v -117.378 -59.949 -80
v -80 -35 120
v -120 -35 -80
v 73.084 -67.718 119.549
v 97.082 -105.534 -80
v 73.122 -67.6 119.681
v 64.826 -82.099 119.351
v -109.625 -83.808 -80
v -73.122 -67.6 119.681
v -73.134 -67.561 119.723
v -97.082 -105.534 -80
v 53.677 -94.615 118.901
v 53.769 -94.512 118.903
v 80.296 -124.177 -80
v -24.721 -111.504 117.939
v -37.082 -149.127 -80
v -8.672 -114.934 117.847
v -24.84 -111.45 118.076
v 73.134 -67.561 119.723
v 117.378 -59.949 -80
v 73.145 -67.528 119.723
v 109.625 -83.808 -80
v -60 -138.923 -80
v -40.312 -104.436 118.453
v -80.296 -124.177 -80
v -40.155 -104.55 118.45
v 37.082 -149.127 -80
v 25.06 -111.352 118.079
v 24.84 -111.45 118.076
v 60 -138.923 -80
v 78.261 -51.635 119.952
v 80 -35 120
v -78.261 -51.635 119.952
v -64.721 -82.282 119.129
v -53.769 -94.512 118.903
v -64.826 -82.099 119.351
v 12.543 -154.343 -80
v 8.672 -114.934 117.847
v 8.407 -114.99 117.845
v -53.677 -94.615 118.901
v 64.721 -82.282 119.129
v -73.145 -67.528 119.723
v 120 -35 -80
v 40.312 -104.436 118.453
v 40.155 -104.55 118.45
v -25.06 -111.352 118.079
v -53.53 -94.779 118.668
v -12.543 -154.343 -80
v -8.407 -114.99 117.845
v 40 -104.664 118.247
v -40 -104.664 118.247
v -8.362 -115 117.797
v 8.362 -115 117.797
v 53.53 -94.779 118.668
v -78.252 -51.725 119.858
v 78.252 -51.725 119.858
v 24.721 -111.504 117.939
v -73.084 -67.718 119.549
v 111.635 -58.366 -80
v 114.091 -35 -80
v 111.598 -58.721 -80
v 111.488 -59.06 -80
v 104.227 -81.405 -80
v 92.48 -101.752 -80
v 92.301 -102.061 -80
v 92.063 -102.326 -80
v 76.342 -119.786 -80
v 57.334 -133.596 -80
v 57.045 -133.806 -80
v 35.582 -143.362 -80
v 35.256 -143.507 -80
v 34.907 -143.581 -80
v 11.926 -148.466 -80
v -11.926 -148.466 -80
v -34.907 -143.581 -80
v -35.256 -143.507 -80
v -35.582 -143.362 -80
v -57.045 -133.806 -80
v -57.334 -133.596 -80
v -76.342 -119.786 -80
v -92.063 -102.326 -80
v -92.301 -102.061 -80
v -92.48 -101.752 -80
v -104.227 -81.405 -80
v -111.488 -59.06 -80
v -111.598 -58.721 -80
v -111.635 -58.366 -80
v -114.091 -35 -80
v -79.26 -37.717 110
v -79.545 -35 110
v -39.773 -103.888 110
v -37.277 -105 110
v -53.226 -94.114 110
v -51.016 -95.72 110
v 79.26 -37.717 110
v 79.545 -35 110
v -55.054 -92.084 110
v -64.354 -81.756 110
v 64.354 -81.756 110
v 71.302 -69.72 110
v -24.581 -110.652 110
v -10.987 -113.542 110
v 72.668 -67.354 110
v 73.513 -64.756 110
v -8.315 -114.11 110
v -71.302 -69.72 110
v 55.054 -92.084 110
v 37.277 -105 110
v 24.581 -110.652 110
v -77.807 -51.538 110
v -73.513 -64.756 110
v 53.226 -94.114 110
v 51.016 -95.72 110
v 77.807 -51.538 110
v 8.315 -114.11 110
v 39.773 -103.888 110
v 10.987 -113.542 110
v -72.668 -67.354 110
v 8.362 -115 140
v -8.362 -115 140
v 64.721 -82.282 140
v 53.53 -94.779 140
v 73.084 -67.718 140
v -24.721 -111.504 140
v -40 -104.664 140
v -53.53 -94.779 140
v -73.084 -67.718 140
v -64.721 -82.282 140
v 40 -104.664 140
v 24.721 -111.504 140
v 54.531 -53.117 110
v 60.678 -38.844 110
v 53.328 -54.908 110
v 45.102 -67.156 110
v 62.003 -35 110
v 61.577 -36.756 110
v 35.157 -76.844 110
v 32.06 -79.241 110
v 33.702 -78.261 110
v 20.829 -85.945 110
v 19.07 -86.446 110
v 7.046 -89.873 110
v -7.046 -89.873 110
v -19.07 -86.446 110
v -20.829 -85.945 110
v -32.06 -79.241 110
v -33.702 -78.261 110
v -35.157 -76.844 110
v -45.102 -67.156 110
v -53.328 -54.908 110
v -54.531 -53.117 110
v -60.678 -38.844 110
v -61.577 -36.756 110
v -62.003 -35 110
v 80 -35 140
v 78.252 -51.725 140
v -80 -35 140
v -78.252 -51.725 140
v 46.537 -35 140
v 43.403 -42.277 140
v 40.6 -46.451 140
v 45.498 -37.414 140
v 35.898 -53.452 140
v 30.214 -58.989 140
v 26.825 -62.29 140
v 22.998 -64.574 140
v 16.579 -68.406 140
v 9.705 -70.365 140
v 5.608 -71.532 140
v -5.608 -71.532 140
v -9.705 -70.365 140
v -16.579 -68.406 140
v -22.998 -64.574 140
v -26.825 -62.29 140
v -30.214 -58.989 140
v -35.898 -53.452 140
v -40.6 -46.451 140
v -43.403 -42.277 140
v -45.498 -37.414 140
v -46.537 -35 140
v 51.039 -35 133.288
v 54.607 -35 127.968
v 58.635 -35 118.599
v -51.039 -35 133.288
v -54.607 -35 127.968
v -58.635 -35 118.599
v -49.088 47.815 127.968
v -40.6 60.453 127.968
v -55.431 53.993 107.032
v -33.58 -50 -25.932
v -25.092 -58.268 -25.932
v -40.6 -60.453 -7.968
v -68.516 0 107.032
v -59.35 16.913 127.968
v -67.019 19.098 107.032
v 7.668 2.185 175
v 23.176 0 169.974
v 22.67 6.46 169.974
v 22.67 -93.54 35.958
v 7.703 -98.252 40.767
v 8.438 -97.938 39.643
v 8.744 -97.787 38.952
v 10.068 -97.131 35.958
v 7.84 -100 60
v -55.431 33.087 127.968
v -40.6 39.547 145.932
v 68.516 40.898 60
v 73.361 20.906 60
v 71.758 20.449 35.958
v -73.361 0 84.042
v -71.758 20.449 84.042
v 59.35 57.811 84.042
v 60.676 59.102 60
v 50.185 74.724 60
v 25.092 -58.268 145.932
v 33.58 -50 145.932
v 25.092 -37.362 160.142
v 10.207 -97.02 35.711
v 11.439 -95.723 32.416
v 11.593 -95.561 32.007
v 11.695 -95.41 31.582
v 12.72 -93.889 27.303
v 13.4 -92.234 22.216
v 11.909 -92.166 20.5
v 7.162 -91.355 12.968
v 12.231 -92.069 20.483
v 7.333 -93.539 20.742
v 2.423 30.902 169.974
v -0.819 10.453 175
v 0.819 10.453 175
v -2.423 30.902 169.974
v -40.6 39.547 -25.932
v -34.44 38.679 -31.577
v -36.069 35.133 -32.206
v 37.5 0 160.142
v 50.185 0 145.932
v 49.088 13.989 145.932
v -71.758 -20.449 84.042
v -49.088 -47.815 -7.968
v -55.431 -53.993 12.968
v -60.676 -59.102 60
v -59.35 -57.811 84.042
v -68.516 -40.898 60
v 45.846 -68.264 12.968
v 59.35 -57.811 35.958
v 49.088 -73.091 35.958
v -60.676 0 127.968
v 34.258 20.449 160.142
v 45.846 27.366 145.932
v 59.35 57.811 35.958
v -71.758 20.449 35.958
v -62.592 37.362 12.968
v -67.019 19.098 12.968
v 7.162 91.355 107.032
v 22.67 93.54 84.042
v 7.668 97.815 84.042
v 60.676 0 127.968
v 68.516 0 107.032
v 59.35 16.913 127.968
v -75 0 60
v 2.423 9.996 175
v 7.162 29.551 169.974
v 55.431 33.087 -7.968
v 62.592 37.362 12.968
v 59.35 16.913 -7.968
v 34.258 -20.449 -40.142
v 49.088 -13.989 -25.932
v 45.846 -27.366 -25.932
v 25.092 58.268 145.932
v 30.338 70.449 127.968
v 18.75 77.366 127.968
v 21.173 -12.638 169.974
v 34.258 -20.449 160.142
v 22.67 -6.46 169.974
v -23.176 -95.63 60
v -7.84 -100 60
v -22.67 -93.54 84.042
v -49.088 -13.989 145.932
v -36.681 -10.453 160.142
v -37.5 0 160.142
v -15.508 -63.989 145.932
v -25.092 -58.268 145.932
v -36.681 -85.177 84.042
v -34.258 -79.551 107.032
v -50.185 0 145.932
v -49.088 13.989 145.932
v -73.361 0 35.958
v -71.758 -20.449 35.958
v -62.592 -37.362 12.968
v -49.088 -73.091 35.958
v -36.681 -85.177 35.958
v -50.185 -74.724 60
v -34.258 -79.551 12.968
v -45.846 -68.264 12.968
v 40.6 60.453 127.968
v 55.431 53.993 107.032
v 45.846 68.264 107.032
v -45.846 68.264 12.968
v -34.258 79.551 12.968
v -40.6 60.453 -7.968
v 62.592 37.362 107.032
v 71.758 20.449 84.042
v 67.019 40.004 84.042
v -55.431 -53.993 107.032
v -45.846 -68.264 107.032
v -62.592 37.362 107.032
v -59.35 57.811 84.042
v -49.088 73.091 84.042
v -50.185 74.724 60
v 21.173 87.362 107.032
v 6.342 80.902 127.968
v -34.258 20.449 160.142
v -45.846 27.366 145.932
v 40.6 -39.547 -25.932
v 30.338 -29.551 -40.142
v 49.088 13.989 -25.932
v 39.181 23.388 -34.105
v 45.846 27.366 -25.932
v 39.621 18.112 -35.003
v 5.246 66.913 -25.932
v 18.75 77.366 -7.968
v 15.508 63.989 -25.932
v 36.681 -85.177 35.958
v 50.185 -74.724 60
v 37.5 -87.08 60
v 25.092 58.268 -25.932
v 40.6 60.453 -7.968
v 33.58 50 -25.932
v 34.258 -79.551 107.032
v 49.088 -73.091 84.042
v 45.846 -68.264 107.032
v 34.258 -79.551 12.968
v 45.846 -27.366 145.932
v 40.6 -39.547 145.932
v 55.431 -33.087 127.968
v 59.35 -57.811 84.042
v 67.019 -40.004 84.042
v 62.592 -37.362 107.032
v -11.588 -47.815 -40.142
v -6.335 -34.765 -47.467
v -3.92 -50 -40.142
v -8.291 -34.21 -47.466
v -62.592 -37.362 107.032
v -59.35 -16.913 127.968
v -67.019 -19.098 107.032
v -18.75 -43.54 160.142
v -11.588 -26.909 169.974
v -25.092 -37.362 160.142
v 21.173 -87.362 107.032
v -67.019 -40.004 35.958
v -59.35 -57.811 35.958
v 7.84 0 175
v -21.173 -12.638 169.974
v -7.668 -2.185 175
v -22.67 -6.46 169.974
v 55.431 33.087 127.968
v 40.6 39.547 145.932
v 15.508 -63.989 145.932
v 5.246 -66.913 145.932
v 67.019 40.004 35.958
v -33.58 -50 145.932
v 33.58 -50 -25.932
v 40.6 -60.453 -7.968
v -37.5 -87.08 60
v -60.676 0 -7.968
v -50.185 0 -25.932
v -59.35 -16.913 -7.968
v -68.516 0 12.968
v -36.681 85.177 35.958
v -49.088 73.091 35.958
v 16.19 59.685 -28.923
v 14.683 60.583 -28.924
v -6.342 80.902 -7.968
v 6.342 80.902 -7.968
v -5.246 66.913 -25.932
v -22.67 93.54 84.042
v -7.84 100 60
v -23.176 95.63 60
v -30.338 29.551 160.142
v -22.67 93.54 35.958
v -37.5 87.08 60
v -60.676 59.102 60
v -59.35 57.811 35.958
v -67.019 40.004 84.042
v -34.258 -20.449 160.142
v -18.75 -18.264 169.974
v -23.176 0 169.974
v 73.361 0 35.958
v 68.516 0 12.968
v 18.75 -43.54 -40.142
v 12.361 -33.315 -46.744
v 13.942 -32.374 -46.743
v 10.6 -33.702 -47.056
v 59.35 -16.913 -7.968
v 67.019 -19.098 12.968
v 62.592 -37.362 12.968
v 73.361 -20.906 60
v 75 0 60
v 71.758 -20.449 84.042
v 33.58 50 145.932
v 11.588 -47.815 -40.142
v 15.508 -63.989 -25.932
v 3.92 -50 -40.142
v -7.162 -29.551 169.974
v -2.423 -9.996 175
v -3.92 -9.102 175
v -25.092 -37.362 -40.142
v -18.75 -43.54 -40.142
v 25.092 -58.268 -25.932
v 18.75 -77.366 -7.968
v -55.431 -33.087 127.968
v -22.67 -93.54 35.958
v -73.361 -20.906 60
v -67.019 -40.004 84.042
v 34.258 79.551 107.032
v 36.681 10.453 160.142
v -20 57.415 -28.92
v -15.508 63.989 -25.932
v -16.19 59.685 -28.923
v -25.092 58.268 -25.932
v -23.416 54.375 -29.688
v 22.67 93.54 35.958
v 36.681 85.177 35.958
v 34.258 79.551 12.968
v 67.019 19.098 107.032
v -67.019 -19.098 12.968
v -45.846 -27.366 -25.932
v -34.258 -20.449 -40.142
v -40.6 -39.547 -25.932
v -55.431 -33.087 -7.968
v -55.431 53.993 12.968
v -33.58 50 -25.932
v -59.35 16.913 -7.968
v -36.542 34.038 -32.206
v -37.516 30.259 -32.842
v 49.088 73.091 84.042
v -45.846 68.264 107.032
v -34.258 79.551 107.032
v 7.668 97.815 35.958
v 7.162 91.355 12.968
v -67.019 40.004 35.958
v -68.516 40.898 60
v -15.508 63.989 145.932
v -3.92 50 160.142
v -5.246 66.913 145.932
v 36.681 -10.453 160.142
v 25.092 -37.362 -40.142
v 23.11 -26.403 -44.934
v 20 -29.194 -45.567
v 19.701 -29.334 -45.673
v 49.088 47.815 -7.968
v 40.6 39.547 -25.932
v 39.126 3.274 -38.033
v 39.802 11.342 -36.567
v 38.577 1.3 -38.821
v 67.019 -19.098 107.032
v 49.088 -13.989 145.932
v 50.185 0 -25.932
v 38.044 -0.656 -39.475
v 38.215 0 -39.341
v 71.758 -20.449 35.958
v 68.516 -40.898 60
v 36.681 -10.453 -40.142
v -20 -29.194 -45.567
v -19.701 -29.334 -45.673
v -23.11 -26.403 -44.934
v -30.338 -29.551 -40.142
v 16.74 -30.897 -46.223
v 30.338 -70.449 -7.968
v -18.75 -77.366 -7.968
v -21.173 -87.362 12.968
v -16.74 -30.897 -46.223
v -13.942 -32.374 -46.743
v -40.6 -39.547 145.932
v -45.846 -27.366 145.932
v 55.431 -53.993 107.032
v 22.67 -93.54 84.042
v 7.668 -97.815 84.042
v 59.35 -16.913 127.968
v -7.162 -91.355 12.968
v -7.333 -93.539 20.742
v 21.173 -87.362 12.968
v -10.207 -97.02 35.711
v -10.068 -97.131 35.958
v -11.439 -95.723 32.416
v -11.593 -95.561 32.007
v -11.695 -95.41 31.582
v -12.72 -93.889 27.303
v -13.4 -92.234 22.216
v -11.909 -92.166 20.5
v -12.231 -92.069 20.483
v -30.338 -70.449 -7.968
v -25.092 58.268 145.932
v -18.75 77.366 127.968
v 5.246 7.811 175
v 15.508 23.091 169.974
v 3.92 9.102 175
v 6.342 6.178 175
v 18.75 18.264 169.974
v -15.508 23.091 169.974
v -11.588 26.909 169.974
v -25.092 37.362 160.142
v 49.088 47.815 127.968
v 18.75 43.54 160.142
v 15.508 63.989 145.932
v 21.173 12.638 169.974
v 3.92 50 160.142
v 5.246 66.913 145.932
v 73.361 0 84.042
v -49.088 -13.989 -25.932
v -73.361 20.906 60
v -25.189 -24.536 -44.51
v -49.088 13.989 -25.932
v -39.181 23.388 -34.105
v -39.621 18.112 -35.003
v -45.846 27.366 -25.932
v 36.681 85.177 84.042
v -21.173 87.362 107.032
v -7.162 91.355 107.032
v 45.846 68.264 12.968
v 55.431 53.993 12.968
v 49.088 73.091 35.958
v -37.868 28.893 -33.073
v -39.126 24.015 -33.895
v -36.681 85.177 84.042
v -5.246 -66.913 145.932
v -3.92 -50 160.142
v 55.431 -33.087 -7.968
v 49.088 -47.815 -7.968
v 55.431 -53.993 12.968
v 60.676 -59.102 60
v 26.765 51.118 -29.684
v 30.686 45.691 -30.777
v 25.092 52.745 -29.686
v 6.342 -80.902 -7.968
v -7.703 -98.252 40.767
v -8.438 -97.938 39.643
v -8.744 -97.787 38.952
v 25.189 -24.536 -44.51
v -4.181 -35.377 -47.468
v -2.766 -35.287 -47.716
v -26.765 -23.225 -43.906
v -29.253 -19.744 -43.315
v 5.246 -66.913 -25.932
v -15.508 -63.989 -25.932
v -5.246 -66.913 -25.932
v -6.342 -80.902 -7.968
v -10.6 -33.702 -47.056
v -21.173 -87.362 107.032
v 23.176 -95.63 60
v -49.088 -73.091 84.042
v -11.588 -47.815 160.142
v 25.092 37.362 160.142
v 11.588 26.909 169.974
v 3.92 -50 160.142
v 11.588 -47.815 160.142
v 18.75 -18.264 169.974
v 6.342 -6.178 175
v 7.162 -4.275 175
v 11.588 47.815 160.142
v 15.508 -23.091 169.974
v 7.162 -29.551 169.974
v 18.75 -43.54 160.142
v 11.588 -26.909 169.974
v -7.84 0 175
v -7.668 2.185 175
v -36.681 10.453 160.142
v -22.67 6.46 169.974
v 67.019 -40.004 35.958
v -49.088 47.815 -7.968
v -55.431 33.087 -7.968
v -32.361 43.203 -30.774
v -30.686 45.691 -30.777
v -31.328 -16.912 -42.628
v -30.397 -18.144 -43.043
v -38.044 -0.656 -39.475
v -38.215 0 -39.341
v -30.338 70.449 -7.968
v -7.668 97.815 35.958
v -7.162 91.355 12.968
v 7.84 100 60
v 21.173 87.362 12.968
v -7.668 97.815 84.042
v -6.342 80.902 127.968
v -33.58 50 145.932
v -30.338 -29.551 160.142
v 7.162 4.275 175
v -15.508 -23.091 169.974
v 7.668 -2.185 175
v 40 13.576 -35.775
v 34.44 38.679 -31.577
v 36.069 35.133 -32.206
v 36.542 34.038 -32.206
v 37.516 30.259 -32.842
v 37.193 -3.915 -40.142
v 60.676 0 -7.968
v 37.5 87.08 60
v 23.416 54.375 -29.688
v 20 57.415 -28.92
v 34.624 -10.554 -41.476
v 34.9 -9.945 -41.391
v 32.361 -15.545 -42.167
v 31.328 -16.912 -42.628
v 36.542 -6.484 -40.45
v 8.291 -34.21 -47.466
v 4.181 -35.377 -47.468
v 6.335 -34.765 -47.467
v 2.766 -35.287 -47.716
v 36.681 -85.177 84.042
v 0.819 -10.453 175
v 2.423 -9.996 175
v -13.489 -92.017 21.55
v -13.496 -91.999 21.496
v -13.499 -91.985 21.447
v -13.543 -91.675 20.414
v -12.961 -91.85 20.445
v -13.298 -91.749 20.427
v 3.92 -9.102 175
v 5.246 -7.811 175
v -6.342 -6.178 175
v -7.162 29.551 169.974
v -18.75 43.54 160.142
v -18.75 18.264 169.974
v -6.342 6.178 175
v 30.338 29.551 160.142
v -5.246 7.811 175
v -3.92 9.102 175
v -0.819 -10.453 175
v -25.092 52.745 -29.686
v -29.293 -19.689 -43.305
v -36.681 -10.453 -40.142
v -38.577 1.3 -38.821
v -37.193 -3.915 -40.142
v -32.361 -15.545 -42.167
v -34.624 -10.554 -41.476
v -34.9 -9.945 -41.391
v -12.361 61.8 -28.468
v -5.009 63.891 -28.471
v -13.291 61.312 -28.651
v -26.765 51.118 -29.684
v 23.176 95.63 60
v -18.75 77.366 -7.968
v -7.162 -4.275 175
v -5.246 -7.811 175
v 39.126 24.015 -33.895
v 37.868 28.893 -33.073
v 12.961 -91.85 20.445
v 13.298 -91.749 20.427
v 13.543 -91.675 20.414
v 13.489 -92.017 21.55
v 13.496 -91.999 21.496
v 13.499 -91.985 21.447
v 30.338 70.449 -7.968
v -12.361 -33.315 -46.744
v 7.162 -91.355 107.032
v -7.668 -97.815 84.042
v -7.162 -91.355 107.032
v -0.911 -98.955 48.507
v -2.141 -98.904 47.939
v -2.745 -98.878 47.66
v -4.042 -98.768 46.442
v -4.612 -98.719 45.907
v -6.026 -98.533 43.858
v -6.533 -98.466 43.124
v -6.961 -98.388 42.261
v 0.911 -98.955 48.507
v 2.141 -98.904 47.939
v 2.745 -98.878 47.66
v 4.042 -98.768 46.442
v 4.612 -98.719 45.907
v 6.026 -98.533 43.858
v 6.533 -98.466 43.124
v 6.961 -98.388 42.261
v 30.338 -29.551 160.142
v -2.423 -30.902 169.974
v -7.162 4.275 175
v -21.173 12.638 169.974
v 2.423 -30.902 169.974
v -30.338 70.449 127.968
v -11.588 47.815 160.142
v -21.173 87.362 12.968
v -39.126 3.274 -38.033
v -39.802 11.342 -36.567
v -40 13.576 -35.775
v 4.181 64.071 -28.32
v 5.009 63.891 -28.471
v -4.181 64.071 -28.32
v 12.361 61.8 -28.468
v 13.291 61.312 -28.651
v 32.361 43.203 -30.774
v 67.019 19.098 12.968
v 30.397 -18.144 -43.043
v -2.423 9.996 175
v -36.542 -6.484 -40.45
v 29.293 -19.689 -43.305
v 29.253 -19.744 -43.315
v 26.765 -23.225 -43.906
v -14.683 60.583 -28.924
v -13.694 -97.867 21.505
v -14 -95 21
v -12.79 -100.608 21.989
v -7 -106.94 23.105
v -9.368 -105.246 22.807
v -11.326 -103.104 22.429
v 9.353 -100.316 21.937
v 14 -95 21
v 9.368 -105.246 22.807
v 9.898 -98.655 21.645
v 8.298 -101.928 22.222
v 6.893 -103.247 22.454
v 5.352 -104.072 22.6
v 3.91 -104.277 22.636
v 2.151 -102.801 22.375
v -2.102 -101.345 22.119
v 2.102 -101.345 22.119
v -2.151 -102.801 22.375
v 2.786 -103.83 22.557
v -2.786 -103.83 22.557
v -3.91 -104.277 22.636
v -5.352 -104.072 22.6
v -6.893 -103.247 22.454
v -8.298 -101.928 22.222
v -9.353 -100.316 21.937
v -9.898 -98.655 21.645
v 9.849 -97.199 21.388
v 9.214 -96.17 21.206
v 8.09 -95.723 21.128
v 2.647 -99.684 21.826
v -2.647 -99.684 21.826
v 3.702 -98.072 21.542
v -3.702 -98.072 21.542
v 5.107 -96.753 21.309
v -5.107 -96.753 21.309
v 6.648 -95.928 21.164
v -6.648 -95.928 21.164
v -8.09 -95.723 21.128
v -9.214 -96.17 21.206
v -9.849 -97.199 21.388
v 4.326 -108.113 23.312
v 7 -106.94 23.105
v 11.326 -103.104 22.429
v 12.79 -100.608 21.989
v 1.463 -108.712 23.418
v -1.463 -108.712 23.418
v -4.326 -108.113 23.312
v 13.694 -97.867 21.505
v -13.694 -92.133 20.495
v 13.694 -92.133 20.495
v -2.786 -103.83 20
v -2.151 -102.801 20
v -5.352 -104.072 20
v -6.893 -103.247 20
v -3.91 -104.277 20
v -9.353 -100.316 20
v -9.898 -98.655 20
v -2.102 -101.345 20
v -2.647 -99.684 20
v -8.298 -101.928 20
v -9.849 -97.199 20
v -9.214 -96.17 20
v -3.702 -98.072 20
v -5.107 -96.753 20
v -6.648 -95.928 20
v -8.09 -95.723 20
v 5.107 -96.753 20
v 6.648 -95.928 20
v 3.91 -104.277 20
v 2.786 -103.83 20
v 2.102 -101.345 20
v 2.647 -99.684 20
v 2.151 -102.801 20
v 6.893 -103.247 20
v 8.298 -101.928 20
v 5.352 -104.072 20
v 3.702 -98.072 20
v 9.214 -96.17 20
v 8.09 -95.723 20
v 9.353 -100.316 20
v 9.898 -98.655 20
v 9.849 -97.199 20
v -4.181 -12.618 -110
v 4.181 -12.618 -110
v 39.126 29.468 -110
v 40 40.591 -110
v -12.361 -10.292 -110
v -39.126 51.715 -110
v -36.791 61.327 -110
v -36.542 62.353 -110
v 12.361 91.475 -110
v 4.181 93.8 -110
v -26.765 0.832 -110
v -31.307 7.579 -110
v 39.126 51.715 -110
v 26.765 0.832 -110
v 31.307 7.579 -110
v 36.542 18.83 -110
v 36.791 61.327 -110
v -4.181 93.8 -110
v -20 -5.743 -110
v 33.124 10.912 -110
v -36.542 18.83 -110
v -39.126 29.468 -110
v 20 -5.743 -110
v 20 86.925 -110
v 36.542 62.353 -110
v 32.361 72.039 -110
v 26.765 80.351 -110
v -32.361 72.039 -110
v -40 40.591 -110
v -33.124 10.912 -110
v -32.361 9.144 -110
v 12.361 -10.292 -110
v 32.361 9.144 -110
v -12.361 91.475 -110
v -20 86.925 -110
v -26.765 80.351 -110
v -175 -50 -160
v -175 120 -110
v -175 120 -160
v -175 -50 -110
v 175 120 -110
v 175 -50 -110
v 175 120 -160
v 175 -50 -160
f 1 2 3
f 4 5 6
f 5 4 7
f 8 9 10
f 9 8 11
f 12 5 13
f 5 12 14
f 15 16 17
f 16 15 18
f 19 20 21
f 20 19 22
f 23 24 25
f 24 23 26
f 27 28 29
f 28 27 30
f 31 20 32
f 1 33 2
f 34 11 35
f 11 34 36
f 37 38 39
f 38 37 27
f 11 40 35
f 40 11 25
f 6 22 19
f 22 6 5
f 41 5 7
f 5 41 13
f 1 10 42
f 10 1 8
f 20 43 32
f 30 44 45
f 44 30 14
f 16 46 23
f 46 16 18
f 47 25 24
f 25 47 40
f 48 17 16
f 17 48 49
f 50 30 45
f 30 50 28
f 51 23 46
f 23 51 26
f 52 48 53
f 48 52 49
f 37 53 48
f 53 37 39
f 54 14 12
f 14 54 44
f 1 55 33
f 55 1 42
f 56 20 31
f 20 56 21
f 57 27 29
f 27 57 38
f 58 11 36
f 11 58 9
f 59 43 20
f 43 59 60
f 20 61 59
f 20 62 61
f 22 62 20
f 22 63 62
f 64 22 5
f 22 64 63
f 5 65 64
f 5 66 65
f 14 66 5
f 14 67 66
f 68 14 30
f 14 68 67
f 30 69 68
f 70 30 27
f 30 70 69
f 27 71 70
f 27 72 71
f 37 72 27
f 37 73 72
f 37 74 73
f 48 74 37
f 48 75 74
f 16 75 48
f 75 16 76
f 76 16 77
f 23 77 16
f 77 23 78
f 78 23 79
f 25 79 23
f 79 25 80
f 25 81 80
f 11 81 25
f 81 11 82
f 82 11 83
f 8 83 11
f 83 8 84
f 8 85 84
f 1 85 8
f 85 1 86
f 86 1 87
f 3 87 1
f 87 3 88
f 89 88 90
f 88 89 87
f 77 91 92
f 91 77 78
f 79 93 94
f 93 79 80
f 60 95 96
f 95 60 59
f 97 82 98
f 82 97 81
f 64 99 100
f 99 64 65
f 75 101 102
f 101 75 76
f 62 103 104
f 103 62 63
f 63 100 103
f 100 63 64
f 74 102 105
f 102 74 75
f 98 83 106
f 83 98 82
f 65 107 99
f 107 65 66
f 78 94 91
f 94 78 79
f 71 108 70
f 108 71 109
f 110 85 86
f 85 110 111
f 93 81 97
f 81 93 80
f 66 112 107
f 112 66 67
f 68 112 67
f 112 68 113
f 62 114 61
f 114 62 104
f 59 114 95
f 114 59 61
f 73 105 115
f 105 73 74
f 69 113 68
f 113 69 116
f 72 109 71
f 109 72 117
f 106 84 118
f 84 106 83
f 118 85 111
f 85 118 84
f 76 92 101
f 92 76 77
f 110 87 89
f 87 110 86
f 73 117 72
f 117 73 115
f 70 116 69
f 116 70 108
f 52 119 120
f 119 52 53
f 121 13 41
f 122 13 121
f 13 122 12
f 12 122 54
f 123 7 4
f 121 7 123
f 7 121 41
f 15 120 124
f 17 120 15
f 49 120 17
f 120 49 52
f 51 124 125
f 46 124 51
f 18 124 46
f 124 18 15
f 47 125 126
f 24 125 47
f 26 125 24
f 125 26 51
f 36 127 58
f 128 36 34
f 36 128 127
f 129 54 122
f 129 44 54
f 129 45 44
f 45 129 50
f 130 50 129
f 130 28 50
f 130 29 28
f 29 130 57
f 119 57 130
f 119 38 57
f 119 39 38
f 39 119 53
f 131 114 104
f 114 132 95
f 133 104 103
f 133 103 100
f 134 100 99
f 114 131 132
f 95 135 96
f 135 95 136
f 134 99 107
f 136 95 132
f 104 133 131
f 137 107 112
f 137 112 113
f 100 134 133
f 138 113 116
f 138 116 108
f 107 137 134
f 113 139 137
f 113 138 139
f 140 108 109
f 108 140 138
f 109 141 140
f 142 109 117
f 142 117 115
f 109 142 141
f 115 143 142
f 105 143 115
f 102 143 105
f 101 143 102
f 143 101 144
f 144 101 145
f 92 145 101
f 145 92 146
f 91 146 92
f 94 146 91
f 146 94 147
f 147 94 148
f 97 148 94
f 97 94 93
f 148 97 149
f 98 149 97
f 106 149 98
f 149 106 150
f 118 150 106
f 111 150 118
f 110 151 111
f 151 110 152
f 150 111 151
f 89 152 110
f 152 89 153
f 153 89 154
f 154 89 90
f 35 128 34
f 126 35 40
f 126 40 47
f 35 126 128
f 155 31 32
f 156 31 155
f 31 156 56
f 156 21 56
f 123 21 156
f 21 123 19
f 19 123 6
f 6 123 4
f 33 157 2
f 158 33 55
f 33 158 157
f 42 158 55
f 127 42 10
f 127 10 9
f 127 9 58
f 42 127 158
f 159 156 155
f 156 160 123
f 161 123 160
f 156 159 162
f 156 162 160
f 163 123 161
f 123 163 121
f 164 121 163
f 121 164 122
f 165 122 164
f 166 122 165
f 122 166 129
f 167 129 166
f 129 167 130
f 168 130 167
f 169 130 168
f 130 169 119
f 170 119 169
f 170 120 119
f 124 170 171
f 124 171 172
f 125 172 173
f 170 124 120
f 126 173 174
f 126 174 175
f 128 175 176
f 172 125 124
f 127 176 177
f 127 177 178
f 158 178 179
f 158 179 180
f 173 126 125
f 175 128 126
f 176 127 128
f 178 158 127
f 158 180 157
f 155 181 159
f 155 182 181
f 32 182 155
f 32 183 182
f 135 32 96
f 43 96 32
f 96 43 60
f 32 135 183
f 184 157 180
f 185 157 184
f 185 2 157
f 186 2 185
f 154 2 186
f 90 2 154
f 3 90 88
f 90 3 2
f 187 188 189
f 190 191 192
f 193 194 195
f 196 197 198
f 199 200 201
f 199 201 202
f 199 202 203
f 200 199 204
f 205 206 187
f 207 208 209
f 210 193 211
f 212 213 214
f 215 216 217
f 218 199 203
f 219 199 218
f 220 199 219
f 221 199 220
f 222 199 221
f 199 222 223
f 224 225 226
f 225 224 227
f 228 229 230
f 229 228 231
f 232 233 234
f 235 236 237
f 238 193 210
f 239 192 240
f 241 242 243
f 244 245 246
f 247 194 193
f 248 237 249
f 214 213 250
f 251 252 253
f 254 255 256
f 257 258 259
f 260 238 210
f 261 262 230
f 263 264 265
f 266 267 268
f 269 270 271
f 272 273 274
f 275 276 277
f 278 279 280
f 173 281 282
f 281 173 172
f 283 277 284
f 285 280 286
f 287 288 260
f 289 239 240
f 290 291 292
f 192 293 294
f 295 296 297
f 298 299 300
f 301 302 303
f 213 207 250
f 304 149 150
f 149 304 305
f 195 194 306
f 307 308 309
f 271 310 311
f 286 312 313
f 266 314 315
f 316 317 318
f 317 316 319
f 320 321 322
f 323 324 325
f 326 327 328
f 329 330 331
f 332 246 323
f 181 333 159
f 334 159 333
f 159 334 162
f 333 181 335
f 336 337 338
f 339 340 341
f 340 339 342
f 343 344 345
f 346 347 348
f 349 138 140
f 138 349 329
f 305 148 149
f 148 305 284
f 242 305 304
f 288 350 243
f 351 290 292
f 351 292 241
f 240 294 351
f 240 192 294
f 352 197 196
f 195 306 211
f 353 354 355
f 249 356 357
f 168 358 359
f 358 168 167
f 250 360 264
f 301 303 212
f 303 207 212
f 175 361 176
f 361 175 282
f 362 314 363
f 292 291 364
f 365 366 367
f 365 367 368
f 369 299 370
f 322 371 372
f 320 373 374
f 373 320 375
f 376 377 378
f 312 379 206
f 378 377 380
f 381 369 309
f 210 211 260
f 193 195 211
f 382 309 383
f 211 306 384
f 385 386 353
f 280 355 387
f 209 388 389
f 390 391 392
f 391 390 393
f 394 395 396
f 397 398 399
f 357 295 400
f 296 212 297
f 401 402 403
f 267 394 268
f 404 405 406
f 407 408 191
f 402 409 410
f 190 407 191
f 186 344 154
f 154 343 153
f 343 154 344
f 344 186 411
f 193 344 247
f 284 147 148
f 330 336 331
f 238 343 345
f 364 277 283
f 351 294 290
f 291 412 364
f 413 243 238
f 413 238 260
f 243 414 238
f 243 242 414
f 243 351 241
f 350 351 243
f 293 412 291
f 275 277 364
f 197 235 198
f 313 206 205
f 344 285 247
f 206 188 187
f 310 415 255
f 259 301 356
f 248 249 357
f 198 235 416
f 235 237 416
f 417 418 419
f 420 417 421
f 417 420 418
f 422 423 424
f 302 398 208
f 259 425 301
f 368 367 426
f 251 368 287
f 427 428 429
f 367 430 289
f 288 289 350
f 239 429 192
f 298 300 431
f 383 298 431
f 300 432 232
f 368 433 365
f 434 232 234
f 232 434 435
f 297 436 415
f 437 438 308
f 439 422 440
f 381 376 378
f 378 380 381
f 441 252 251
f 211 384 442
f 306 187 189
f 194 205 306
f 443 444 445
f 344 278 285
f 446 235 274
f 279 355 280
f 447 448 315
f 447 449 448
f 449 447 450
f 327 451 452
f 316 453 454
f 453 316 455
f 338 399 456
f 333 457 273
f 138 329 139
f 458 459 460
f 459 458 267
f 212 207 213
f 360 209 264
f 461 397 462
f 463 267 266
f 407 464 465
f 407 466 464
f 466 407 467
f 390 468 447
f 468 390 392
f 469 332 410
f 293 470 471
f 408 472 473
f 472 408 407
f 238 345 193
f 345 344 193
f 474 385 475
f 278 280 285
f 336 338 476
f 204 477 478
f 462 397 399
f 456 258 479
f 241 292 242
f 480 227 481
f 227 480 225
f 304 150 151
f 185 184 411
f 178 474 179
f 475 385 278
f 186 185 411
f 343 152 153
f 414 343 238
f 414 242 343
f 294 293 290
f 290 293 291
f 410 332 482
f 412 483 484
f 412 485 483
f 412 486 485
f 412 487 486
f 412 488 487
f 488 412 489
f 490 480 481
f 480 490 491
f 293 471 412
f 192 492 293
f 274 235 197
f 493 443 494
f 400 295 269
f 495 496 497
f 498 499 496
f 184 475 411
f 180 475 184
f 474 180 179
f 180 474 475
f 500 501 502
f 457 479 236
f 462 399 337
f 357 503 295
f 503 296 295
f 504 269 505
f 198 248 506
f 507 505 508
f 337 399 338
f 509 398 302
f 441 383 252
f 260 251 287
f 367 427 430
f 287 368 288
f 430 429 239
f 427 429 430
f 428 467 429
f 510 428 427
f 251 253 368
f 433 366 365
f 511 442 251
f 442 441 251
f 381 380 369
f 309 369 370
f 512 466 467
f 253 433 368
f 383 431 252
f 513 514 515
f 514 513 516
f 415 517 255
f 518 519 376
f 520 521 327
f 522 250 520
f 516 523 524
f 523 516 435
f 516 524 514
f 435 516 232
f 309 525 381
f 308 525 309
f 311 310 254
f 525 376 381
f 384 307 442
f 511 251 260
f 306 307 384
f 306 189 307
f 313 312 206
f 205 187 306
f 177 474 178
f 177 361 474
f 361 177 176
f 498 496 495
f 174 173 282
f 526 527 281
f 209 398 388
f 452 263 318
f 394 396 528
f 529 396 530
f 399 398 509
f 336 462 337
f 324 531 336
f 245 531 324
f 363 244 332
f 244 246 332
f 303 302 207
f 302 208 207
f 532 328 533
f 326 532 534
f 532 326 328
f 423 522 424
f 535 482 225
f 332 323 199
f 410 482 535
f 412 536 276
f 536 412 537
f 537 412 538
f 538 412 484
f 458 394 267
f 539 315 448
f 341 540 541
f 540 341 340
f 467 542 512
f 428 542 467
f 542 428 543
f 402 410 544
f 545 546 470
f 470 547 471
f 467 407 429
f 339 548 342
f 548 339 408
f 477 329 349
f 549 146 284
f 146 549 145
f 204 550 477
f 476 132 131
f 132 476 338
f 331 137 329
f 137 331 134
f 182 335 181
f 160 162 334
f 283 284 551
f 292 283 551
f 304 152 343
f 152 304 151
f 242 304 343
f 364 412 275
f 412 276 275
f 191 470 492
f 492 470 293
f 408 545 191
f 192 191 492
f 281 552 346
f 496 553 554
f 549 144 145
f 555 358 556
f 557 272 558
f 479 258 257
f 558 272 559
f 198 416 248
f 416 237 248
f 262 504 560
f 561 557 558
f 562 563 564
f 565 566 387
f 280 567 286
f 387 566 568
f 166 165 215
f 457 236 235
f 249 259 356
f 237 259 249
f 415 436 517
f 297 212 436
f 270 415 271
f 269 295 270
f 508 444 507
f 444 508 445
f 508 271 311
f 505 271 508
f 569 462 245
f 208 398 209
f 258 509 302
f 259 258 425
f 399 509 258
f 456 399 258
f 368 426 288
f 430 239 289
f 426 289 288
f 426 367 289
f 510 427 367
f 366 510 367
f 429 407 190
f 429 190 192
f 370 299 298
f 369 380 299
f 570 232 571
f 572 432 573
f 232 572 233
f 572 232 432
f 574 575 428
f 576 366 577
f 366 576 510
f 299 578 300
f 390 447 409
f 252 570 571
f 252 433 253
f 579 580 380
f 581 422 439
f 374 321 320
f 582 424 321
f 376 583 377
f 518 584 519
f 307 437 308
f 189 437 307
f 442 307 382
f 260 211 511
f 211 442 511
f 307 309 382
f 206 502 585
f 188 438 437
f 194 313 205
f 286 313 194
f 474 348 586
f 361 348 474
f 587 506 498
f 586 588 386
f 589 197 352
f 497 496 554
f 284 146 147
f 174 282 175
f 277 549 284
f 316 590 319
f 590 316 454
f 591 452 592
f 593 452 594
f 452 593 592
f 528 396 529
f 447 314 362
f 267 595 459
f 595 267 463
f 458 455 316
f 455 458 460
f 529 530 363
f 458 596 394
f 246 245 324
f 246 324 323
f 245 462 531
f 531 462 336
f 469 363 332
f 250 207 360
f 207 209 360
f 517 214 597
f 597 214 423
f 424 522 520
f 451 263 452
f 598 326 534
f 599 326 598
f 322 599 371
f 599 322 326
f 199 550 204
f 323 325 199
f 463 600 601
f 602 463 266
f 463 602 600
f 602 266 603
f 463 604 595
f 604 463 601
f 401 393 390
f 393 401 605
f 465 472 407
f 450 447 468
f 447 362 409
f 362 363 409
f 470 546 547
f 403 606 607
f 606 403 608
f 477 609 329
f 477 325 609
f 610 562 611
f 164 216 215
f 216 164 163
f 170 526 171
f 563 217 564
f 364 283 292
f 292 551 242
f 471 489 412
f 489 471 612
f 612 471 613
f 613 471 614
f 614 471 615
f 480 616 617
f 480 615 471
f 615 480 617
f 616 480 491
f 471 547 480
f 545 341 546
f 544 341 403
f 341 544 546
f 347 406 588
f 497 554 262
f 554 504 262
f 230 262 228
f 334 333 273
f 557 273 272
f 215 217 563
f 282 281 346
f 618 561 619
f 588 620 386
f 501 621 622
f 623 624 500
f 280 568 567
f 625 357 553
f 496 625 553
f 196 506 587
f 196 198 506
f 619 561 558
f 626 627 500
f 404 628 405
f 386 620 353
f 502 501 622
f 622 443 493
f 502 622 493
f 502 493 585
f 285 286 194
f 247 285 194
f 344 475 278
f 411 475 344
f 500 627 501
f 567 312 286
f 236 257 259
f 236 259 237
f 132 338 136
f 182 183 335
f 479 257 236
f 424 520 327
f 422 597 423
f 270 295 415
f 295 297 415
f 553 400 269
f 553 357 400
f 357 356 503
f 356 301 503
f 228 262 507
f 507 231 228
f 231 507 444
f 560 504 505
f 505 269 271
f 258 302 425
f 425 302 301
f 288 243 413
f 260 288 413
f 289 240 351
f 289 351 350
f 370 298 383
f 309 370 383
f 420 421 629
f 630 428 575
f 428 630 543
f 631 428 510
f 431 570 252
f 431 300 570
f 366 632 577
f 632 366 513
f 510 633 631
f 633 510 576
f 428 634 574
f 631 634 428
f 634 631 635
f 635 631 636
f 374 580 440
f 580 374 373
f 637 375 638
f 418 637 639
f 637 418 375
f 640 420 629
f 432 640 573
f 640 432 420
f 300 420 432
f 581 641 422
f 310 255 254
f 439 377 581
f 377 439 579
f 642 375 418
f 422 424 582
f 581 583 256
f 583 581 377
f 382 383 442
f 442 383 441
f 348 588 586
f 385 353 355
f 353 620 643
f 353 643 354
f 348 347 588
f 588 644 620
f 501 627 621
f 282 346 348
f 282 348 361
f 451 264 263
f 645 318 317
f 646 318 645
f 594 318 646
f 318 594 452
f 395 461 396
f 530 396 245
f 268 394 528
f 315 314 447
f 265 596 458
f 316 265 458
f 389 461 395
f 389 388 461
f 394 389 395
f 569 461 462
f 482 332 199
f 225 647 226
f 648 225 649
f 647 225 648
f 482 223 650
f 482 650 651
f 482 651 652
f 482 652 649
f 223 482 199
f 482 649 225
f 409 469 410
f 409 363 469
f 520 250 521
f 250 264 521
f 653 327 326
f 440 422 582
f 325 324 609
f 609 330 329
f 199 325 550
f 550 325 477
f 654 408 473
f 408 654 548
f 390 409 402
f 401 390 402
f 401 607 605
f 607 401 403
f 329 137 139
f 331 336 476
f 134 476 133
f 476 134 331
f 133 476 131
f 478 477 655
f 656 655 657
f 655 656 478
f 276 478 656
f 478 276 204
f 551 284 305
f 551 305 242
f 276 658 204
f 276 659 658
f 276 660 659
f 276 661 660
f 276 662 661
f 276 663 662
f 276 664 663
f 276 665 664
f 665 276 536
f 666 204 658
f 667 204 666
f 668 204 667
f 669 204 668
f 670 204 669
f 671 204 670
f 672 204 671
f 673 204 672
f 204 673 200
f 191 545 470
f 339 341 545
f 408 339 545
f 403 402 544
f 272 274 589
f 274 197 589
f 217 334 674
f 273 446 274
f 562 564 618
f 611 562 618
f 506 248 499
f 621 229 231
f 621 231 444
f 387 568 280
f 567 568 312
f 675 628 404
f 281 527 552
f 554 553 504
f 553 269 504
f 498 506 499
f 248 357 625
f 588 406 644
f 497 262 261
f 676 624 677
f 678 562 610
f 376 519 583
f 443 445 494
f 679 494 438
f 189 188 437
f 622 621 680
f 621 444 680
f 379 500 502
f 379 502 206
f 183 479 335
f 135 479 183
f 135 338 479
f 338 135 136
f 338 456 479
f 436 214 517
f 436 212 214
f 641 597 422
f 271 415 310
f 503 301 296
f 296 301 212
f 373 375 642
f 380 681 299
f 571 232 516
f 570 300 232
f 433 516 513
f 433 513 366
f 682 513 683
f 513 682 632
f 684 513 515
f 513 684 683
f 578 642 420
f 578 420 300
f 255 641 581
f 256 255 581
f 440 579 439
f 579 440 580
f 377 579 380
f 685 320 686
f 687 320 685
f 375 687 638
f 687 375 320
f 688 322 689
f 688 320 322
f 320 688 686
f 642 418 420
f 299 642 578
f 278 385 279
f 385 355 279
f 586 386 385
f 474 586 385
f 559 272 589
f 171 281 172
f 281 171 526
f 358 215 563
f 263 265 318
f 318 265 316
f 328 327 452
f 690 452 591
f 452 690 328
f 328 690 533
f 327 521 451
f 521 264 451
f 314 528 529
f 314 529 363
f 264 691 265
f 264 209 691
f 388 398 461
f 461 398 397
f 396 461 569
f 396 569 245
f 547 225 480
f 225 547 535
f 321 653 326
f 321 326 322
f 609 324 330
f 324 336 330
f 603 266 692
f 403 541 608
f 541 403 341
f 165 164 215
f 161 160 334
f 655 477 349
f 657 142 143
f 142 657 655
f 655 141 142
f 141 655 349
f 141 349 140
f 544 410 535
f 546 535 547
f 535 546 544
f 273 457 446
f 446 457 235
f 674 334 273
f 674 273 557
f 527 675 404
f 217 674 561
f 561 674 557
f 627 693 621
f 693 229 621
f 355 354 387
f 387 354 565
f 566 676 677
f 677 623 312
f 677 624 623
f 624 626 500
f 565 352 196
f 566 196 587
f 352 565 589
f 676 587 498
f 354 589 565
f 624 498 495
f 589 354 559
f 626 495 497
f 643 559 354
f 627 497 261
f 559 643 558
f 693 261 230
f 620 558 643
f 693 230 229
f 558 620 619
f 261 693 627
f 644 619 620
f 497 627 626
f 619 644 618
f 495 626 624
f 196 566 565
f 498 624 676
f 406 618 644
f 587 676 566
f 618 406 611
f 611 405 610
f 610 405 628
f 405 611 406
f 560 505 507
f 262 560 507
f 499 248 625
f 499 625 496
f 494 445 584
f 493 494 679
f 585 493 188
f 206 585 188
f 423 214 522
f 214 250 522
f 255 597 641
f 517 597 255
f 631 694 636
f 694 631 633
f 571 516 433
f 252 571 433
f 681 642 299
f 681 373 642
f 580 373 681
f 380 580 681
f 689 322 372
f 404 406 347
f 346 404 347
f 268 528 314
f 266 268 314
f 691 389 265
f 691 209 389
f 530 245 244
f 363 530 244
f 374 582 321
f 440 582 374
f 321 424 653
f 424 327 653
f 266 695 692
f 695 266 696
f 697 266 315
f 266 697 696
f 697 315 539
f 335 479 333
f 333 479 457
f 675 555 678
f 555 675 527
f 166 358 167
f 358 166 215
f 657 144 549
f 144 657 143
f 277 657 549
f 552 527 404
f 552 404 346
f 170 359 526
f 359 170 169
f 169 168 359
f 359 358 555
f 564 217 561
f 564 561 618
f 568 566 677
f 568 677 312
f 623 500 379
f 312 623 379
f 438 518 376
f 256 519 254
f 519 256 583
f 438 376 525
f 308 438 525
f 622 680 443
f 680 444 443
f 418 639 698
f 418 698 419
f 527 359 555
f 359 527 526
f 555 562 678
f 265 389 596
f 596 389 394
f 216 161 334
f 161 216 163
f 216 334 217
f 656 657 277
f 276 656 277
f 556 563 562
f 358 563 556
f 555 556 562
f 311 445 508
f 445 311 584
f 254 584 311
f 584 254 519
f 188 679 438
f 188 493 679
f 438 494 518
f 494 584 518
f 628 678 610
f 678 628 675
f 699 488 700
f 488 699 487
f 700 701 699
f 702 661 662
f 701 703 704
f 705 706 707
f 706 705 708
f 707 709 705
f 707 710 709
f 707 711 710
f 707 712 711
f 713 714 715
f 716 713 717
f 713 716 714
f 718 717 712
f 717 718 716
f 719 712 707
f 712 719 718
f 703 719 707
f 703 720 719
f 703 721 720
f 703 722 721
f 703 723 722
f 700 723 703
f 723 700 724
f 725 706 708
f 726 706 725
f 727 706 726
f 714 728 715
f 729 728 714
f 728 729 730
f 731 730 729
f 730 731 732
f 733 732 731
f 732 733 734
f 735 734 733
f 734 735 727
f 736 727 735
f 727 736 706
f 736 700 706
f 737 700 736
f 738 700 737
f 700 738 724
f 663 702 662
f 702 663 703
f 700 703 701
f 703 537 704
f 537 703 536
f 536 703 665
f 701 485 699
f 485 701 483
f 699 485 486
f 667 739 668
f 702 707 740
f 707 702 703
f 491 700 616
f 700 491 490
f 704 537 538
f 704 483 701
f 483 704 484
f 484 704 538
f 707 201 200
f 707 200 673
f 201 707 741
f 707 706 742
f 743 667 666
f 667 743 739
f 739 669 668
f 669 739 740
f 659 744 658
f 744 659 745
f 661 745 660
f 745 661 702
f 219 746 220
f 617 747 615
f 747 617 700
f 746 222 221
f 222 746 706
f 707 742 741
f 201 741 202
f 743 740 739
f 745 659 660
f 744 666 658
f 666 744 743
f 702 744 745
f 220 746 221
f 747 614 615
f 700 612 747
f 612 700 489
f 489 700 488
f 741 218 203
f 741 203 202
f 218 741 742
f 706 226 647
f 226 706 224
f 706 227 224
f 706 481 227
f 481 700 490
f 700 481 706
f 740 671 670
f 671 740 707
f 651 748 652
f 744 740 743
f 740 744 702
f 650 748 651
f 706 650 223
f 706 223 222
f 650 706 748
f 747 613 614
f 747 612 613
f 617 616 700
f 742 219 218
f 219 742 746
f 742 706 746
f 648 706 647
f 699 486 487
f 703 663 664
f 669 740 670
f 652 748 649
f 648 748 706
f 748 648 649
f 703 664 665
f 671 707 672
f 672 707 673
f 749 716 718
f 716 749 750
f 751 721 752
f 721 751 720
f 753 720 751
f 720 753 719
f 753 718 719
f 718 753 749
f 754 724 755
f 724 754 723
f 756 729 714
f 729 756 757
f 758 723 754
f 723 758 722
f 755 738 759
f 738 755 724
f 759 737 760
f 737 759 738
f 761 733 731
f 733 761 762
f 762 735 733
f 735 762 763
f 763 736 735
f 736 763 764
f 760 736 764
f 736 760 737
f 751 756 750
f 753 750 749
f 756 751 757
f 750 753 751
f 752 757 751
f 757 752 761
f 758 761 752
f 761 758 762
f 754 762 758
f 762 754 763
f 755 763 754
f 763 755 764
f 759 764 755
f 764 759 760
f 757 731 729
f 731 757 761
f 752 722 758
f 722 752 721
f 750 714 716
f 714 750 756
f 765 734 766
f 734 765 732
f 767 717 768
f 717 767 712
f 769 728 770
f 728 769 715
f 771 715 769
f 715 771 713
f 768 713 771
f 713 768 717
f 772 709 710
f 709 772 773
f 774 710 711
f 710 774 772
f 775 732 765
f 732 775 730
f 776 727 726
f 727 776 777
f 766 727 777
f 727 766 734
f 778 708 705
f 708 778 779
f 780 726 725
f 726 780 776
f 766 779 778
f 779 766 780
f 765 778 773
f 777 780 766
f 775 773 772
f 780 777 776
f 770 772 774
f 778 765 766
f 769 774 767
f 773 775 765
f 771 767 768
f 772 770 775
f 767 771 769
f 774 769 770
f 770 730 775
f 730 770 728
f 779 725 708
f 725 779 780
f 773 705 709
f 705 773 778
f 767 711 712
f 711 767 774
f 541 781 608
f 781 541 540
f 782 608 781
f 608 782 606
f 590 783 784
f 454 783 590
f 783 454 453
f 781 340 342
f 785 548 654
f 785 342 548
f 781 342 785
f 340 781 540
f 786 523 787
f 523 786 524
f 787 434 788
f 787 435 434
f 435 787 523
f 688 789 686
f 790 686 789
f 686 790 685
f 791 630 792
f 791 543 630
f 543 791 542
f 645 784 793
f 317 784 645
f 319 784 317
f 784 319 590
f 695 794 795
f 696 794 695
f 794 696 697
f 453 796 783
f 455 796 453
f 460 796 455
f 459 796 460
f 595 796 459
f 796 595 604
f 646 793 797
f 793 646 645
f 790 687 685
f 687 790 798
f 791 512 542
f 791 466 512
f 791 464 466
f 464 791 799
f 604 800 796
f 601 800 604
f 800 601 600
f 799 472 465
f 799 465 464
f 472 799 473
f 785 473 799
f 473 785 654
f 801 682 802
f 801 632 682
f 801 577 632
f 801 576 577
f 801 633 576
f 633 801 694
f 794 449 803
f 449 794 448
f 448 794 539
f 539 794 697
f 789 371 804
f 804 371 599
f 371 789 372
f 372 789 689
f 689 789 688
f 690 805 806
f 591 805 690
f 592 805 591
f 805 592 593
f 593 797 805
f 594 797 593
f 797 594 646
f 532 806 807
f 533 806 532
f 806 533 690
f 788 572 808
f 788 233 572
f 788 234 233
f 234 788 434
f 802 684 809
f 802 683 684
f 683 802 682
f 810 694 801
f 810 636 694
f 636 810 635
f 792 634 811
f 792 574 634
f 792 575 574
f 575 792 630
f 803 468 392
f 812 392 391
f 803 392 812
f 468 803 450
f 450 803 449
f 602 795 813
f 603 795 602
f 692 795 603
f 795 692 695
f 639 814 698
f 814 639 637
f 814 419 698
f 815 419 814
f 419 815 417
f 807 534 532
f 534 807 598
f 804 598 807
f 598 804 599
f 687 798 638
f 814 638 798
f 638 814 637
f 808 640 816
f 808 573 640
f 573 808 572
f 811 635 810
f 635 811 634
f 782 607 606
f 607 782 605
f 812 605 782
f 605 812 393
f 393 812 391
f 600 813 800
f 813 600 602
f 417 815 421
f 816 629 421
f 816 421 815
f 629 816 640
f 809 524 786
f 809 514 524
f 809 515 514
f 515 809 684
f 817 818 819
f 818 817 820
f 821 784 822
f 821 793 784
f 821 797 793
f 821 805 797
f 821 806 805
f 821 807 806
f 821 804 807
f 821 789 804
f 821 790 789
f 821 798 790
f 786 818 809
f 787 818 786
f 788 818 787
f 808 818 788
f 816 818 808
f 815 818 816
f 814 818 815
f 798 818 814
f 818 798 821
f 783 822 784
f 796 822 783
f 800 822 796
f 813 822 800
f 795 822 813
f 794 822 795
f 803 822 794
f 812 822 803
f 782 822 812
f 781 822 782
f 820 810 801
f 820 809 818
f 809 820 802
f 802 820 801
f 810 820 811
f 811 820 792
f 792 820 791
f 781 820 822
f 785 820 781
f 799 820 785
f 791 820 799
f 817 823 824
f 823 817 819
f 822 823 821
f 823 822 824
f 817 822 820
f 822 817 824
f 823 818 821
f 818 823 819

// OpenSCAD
translate([0,0,60])
    rotate(a=[0,0,180])
        union() {
            difference() { 
                union() {
                    
                    // shield
                    difference() {
                        translate([0,35,-140])
                            cylinder(h=200, r1=120, r2=80); // front
                        translate([0,35,-145])
                            cylinder(h=220, r1=115, r2=75); // back
                    }
                     
                    // connection
                    translate([0,35,50])
                        linear_extrude(height=30) // recess ignored
                            resize([160,160])
                                circle(d=100);
                }
                
                // remove half of above volumes
                translate([-150,-365,-150])
                    cube(400);  
            }

            // Dimensions: https://en.wikipedia.org/wiki/Human_head#Average_head_sizes 

            // head
            resize(newsize=[150, 200, 230])
                sphere(r=100);

            // nose 
            translate([0,95,-39])
                rotate(a=[10,0,0])
                    cylinder(h=45, r1=14, r2=5);
            
            // nostrils: 100mm to shield's bottom edge
            translate([6,100,-40])
                rotate(a=[0,0,40])
                    linear_extrude(height=5)
                        resize([6, 10])
                            circle(d=10);
            translate([-6,100,-40])
                rotate(a=[0,0,-40])
                    linear_extrude(height=5)
                        resize([6, 10])
                            circle(d=10); 
            
            // neck
            rotate([-20,0,0])
                translate([0,20,-200])
                    linear_extrude(height=200)
                        resize([80,100])
                            circle(d=100);
            
            // body
            translate([-175,-120,-220])
                cube([350,170,50]);
        }
